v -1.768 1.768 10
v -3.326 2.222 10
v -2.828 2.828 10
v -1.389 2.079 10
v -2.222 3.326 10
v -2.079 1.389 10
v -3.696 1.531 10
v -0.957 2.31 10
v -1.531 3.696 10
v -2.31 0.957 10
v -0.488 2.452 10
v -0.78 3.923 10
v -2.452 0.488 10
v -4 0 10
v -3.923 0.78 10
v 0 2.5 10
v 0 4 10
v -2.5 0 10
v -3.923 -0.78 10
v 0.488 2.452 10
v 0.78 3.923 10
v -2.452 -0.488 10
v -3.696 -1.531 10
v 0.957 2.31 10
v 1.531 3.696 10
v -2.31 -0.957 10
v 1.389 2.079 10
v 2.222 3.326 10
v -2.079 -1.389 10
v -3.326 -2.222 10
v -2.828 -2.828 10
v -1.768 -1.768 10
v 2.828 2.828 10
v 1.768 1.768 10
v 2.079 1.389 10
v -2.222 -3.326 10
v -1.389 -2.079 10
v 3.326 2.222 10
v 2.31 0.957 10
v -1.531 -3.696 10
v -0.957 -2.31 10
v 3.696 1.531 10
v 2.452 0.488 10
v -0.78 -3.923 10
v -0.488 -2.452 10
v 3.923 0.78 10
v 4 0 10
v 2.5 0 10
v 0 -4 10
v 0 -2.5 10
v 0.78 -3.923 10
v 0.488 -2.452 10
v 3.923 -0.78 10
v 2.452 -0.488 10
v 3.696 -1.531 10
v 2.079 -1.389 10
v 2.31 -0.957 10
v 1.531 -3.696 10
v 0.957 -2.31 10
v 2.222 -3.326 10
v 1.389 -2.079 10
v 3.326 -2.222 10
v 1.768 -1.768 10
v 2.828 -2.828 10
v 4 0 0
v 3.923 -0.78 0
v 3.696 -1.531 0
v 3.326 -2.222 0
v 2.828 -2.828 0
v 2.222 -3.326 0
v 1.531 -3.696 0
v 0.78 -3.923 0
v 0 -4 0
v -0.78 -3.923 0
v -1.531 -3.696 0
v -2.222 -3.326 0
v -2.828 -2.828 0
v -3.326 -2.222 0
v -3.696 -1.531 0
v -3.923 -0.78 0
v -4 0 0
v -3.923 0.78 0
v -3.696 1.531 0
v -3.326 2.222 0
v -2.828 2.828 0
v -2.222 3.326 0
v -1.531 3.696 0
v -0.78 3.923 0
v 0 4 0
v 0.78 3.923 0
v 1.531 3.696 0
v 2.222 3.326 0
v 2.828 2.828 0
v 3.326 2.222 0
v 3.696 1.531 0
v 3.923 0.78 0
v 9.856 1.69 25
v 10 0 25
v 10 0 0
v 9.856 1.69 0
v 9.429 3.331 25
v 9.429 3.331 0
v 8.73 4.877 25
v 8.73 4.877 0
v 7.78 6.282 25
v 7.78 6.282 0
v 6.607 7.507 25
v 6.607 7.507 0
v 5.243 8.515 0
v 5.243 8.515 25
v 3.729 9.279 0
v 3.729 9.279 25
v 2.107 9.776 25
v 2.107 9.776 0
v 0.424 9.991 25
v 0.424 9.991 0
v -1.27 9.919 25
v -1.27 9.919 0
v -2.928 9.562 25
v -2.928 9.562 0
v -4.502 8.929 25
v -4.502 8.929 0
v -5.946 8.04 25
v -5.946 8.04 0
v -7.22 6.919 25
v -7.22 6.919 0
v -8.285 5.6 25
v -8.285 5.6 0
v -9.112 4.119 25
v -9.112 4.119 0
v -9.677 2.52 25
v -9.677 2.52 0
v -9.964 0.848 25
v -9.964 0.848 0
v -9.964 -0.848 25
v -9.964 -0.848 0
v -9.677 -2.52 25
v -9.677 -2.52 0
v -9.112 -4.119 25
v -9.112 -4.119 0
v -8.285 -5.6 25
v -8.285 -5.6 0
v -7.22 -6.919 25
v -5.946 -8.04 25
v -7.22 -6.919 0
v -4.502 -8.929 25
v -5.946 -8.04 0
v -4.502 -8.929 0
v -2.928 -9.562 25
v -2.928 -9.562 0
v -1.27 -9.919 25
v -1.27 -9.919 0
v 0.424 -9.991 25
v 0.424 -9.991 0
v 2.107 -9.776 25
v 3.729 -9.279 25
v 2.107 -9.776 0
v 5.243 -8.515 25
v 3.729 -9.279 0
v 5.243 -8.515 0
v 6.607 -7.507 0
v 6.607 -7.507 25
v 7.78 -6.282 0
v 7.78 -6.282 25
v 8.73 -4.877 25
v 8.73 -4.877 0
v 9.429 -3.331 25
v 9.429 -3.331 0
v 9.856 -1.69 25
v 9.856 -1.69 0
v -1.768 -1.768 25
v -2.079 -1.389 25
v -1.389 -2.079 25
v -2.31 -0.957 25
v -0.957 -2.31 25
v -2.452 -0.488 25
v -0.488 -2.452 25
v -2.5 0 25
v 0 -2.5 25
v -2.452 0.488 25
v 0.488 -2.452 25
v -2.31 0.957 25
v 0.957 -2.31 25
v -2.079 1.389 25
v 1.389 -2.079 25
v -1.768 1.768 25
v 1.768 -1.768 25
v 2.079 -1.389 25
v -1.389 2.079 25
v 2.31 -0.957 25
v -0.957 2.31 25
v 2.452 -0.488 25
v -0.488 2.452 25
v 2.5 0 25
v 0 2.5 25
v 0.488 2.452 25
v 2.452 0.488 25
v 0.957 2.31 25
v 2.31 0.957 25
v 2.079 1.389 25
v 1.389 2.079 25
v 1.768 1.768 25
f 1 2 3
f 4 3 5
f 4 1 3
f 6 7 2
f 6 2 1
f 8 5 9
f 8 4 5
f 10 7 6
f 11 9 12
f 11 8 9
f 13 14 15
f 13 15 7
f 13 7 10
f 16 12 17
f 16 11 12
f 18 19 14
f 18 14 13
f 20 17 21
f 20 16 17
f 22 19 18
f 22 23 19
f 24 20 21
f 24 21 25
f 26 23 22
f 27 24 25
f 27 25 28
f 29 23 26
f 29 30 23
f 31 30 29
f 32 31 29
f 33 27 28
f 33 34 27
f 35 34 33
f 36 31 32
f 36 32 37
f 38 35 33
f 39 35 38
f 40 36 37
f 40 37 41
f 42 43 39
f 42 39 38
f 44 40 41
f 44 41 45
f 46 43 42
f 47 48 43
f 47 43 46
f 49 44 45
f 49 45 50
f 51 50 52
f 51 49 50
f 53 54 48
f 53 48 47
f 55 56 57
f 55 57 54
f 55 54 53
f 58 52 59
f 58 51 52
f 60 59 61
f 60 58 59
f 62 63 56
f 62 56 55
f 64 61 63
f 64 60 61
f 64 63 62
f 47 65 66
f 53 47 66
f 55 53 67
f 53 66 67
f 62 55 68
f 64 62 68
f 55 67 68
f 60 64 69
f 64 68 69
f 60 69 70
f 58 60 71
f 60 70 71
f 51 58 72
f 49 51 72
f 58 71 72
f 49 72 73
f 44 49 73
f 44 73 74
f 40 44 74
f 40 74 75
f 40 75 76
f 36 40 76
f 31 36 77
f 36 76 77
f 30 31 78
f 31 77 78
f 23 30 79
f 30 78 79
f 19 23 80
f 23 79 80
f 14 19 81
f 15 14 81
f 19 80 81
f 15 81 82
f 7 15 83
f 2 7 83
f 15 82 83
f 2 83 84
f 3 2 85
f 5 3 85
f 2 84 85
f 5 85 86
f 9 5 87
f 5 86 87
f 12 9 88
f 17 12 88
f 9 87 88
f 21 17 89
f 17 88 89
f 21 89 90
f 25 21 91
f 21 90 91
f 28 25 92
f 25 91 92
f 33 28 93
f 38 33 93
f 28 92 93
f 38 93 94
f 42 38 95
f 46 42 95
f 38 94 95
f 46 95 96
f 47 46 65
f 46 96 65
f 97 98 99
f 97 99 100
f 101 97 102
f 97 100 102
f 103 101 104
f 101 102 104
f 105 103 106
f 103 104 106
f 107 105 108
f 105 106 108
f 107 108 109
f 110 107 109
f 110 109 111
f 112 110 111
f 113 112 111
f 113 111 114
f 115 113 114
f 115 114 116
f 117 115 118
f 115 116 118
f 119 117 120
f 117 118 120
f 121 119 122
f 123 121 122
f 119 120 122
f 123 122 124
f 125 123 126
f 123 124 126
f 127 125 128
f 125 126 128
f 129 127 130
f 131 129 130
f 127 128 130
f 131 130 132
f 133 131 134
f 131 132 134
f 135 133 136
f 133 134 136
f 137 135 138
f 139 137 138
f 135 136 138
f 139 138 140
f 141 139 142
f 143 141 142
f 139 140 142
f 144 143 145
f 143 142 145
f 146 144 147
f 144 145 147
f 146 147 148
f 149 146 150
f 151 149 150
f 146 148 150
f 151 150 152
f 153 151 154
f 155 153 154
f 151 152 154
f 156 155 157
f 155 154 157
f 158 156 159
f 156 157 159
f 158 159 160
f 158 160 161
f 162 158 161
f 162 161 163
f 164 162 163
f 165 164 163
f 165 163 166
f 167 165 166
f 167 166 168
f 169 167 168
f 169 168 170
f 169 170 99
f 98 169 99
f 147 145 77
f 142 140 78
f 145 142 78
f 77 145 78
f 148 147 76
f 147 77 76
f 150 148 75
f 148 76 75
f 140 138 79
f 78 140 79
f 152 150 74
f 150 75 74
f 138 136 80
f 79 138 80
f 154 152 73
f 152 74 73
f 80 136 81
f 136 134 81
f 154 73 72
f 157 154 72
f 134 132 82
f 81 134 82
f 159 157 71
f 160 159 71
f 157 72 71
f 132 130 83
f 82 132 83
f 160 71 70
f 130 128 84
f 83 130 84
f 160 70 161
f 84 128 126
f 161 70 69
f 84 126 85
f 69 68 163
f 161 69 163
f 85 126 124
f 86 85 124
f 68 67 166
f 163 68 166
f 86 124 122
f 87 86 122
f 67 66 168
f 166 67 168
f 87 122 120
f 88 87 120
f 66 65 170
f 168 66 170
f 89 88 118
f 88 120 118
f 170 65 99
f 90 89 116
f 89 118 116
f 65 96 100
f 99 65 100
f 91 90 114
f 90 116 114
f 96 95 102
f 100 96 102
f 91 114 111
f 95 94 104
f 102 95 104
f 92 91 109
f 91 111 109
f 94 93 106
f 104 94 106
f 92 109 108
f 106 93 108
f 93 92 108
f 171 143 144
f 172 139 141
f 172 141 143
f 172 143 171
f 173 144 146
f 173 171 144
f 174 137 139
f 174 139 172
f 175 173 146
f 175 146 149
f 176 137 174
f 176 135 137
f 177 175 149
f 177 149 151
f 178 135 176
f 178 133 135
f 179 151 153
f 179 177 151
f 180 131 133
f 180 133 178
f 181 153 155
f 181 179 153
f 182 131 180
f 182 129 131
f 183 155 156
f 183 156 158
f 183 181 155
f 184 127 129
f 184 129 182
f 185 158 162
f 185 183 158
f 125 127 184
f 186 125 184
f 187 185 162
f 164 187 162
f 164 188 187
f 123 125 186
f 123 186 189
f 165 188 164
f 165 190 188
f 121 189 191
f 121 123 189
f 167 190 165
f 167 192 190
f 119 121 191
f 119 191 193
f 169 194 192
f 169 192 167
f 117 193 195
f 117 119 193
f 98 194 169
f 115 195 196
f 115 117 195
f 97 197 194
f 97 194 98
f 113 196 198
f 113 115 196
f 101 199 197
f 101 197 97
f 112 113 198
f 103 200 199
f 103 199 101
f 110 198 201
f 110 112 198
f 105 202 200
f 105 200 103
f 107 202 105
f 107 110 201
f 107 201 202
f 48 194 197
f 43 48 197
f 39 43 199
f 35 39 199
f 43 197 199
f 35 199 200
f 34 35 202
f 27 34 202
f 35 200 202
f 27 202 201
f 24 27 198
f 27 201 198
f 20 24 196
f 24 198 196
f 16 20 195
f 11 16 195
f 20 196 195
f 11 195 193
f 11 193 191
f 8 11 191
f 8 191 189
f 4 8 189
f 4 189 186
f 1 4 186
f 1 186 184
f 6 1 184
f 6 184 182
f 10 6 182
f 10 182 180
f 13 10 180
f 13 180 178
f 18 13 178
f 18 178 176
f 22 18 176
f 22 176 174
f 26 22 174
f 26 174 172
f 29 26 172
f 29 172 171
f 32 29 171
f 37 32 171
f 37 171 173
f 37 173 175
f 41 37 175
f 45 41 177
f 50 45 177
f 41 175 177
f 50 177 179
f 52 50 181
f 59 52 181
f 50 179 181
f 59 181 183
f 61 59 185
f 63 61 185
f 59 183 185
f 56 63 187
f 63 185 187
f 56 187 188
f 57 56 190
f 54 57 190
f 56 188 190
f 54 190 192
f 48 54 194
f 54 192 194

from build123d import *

# Parameters (mm, degrees)
F0_R     = 10
F1_DEPTH = 7.5
F2_R     = 10
F3_DEPTH = 10
F4_R     = 10
F5_DEPTH = 7.5
F6_R     = 2.5
F7_DEPTH = 25
F8_R     = 4
F9_DEPTH = 10


with BuildPart() as f1:
    # F0 (on Top) → F1 (new body)
    with BuildSketch(Plane.XY):
        Circle(F0_R)
    extrude(amount=F1_DEPTH)

    # F2 (on face) → F3 (join)
    with BuildSketch(Plane.XY.offset(7.5)):
        Circle(F2_R)
    extrude(amount=F3_DEPTH)

    # F4 (on face) → F5 (join)
    with BuildSketch(Plane.XY.offset(17.5)):
        Circle(F4_R)
    extrude(amount=F5_DEPTH)

    # F6 (on face) → F7 (cut)
    with BuildSketch(Plane.XY.offset(25)):
        Circle(F6_R)
    extrude(amount=-F7_DEPTH, mode=Mode.SUBTRACT)

    # F8 (on face) → F9 (cut)
    with BuildSketch(Plane(origin=(0, 0, 0), x_dir=(1, 0, 0), z_dir=(0, 0, -1))):
        Circle(F8_R)
    extrude(amount=-F9_DEPTH, mode=Mode.SUBTRACT)


solid = f1.part
